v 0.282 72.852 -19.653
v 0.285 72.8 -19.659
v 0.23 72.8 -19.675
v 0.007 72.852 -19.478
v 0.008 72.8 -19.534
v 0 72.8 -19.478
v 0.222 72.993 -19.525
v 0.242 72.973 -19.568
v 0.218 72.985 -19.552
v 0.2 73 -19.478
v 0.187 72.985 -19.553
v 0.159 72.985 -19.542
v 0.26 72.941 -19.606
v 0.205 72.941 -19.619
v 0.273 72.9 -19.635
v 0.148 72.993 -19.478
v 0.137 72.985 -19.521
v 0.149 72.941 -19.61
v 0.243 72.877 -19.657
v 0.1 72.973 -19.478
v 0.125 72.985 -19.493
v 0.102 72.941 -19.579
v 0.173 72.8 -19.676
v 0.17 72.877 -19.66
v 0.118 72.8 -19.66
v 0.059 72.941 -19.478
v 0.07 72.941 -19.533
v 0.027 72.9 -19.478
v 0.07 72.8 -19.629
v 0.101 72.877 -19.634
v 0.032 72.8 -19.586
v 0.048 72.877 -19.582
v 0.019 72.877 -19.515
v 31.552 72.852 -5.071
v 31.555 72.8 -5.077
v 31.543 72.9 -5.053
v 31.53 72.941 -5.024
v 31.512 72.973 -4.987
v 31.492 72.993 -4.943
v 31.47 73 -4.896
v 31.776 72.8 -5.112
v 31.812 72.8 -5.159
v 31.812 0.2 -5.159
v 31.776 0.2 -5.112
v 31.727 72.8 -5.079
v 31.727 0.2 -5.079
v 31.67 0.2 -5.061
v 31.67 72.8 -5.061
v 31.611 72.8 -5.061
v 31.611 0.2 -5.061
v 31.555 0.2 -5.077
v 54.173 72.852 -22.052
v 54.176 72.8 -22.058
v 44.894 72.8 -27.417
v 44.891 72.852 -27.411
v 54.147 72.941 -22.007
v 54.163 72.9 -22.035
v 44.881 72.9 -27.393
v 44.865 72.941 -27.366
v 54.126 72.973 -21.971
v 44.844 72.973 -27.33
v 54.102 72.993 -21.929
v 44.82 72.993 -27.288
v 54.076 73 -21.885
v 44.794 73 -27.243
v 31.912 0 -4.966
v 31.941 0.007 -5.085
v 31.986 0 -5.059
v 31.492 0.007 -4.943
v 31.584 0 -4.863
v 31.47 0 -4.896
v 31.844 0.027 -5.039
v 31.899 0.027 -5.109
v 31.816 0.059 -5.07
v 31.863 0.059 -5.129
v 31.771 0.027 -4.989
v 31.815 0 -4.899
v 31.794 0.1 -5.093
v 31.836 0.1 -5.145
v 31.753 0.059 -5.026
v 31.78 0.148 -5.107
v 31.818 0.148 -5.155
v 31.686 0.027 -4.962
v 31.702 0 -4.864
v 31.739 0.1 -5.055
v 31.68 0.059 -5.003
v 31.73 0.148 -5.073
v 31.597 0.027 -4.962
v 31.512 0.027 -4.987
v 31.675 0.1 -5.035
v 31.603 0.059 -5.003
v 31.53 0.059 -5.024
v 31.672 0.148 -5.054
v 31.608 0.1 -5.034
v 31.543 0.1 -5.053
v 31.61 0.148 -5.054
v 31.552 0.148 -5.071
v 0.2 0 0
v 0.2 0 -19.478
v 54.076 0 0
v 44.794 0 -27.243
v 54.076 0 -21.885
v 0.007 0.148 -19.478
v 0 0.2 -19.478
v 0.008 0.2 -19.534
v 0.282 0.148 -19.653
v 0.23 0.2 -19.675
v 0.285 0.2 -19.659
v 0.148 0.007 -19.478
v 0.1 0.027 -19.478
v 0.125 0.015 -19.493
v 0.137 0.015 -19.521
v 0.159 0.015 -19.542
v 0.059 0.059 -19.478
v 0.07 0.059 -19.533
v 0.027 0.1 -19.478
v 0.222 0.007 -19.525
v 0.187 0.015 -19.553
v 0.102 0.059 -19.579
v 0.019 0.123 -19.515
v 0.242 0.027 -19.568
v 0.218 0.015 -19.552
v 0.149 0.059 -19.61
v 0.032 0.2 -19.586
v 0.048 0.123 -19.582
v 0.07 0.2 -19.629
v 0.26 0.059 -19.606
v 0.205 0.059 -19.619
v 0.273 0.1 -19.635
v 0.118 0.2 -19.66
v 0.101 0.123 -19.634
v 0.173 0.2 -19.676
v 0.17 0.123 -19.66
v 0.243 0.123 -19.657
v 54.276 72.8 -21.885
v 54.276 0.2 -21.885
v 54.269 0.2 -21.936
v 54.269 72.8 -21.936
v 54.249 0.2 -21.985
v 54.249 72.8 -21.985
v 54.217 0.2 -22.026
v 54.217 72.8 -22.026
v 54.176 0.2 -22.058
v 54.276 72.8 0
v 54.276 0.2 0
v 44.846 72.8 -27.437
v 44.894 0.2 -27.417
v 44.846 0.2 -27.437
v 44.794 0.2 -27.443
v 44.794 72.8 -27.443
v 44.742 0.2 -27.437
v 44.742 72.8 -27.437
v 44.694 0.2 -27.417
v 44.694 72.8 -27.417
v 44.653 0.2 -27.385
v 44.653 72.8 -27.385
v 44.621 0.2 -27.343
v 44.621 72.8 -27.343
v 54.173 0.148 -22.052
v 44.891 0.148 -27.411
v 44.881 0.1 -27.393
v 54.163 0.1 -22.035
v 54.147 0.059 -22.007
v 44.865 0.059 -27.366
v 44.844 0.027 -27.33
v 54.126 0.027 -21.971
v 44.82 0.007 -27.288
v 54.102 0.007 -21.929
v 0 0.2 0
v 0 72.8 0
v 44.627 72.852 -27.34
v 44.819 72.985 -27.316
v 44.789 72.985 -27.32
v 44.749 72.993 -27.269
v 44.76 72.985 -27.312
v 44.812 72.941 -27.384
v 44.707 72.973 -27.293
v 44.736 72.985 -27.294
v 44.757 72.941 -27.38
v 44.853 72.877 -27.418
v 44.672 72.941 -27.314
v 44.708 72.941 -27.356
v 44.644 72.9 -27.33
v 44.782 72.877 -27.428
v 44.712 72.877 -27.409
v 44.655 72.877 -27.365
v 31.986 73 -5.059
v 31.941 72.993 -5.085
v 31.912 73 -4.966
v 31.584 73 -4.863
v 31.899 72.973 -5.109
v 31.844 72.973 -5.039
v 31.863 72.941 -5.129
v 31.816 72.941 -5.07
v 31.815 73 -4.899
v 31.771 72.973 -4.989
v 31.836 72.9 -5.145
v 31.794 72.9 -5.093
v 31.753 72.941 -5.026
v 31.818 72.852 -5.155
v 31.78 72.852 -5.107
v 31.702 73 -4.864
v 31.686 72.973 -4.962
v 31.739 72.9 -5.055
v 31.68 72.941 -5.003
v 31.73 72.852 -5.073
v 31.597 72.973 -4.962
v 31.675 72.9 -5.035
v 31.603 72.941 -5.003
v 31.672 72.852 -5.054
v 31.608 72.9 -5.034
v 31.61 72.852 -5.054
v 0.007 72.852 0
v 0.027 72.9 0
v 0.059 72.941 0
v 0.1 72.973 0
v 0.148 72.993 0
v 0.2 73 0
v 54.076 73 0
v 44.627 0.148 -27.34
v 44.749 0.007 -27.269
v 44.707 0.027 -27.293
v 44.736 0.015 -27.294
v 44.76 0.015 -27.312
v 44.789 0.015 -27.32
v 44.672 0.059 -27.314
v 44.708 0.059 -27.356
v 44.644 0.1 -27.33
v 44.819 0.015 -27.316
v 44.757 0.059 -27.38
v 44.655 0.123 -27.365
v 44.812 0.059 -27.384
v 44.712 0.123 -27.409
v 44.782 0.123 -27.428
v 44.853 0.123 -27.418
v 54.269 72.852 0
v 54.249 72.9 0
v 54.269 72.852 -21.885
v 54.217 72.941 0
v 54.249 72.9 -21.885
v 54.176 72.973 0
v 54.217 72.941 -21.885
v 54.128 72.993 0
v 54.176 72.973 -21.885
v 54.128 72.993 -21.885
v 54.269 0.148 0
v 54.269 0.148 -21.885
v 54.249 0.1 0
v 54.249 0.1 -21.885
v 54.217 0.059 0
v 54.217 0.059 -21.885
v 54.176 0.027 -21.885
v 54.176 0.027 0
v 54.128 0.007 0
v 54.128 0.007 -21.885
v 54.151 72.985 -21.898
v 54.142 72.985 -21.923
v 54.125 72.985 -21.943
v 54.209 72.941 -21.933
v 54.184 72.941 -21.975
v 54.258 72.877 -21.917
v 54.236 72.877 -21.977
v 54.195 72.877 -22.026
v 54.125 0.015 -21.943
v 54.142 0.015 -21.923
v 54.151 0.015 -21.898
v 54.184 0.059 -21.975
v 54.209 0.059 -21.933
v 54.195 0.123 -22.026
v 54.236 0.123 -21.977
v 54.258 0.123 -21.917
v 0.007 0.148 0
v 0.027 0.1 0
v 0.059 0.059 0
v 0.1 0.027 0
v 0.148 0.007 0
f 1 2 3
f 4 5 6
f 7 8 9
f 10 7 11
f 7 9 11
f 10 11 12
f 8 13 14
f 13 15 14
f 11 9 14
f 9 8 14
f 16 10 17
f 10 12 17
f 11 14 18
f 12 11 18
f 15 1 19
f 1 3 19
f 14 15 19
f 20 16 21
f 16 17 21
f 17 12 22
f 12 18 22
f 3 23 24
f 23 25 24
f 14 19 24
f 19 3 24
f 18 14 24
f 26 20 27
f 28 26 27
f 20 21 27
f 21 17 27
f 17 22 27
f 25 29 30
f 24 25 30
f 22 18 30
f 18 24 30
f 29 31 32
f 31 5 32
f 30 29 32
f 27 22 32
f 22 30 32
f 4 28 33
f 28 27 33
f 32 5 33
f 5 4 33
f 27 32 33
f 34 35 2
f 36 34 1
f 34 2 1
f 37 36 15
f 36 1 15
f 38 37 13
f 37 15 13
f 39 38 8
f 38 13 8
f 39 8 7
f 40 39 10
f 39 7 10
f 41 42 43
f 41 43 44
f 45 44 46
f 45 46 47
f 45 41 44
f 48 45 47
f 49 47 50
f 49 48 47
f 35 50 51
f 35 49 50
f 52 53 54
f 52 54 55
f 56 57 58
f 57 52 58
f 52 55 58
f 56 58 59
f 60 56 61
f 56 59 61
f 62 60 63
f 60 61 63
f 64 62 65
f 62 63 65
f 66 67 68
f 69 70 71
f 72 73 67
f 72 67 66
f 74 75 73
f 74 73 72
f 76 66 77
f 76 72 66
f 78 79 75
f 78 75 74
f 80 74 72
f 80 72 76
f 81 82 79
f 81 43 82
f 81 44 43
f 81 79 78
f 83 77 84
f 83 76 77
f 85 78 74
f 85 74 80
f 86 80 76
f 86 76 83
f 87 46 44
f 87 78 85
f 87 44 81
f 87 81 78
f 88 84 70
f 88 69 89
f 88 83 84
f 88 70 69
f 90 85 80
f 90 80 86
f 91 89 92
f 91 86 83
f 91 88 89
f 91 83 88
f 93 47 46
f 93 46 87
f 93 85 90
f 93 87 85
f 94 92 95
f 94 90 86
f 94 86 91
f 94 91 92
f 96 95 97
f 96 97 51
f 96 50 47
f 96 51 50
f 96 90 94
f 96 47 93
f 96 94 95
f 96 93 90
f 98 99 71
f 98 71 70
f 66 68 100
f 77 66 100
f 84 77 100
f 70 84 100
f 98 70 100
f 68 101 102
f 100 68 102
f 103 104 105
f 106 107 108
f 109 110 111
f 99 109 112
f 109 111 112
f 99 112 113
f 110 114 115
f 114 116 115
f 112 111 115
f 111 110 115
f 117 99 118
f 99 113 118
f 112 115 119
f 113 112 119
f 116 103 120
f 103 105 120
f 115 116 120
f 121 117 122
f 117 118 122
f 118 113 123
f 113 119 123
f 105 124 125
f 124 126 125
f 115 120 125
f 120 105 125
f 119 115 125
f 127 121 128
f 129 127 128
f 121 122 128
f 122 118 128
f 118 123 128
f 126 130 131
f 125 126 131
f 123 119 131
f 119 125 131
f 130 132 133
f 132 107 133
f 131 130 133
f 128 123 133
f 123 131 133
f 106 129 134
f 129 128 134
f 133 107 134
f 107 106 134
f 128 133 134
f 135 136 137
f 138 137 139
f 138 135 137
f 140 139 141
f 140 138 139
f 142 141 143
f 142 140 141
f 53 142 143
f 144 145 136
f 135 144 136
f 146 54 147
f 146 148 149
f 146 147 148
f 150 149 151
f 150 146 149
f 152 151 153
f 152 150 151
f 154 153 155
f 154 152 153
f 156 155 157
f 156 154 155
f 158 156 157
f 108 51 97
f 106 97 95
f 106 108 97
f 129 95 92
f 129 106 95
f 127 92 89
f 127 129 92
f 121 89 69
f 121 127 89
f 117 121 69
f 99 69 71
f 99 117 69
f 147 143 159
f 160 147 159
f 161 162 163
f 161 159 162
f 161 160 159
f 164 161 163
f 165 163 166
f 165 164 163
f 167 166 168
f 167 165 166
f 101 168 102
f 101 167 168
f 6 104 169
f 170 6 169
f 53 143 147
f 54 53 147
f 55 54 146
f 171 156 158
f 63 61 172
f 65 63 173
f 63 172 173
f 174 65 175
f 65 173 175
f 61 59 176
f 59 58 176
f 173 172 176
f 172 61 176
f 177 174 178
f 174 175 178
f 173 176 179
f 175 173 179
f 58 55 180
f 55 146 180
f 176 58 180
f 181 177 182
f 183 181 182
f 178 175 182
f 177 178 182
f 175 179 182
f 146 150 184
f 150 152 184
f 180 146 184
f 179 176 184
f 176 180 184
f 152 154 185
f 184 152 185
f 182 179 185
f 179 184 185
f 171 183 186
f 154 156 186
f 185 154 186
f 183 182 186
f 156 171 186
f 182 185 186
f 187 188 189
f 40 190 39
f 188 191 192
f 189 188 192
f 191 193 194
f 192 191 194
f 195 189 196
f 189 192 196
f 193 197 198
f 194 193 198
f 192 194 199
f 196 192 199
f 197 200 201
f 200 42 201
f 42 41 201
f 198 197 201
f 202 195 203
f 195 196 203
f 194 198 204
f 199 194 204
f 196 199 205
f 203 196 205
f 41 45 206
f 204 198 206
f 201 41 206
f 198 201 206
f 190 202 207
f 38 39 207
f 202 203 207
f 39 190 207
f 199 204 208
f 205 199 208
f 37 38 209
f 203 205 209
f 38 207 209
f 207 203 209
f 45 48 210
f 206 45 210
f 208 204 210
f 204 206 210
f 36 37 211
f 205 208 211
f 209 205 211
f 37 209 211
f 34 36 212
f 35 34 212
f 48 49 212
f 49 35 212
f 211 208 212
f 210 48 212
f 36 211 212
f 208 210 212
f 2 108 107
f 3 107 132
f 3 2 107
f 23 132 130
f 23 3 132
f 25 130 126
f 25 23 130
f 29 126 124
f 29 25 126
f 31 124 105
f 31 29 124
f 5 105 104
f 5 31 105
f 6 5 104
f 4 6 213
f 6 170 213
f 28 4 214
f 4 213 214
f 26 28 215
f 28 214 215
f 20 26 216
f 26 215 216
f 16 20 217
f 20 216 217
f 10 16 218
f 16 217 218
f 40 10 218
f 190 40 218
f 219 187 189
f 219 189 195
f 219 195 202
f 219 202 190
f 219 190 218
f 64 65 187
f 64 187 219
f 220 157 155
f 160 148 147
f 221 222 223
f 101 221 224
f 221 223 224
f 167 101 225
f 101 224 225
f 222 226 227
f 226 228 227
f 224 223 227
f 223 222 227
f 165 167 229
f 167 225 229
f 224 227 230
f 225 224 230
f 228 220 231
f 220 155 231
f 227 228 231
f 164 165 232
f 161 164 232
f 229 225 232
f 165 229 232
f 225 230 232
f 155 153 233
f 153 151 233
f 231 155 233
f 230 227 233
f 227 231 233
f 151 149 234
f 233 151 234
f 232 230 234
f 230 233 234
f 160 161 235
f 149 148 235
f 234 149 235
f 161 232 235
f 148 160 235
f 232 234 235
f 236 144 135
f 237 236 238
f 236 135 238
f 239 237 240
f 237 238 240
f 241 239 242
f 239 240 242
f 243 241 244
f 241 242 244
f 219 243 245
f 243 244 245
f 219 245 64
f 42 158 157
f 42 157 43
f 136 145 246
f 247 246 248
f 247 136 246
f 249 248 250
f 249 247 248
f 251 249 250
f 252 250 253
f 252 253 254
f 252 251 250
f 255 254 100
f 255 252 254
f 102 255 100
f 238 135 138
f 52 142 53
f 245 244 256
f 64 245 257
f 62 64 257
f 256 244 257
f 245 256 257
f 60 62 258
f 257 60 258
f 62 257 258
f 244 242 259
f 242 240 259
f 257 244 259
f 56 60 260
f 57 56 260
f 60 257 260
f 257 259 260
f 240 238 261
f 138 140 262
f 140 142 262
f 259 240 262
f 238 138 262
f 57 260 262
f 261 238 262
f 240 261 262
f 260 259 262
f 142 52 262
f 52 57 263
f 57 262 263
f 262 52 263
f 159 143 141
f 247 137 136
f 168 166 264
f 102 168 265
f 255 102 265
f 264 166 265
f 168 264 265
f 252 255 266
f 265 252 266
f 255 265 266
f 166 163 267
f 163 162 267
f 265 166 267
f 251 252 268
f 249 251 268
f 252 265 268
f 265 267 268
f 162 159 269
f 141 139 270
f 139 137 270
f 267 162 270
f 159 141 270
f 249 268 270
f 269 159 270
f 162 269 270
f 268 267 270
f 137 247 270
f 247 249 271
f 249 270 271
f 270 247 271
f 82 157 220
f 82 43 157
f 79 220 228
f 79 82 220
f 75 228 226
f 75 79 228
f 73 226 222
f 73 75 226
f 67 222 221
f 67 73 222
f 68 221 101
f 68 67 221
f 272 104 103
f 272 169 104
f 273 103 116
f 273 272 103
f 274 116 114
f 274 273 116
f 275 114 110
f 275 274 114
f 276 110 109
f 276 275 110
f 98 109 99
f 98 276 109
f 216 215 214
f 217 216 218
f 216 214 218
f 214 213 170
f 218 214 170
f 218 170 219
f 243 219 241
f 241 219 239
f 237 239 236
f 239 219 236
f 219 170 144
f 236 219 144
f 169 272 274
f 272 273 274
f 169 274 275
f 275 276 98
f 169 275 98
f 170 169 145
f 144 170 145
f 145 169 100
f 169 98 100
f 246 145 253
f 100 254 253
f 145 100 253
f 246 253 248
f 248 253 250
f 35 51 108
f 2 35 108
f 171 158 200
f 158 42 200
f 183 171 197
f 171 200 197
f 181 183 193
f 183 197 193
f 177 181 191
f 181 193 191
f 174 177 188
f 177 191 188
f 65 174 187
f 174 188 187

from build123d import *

# Parameters (mm, degrees)
BOSS_EXTRUDE1_DEPTH = 73
FILLET1_R           = 0.2


with BuildPart() as part:
    # Sketch1 → Boss-Extrude1 (new body)
    with BuildSketch(Plane(origin=(0, 0, 0), x_dir=(1, 0, 0), z_dir=(0, 1, 0))):
        Polygon((0, 0), (54.275908818, 0), (54.275908818, 22), (44.720772546, 27.516660498), (31.720772546, 5), (0, 19.791639161), align=None)
    extrude(amount=BOSS_EXTRUDE1_DEPTH)

    # Fillet1
    fillet1_edges = [part.edges().sort_by_distance(p)[0] for p in [
        (31.720772546, 36.5, -5),
        (44.720772546, 36.5, -27.516660498),
        (54.275908818, 36.5, -22),
        (0, 36.5, -19.791639161),
        (54.275908818, 73, -11),
        (49.498340682, 73, -24.758330249),
        (38.220772546, 73, -16.258330249),
        (15.860386273, 73, -12.39581958),
        (38.220772546, 0, -16.258330249),
        (49.498340682, 0, -24.758330249),
        (54.275908818, 0, -11),
        (0, 73, -9.89581958),
        (0, 0, -9.89581958),
        (15.860386273, 0, -12.39581958),
    ]]
    fillet(fillet1_edges, radius=FILLET1_R)


solid = part.part
